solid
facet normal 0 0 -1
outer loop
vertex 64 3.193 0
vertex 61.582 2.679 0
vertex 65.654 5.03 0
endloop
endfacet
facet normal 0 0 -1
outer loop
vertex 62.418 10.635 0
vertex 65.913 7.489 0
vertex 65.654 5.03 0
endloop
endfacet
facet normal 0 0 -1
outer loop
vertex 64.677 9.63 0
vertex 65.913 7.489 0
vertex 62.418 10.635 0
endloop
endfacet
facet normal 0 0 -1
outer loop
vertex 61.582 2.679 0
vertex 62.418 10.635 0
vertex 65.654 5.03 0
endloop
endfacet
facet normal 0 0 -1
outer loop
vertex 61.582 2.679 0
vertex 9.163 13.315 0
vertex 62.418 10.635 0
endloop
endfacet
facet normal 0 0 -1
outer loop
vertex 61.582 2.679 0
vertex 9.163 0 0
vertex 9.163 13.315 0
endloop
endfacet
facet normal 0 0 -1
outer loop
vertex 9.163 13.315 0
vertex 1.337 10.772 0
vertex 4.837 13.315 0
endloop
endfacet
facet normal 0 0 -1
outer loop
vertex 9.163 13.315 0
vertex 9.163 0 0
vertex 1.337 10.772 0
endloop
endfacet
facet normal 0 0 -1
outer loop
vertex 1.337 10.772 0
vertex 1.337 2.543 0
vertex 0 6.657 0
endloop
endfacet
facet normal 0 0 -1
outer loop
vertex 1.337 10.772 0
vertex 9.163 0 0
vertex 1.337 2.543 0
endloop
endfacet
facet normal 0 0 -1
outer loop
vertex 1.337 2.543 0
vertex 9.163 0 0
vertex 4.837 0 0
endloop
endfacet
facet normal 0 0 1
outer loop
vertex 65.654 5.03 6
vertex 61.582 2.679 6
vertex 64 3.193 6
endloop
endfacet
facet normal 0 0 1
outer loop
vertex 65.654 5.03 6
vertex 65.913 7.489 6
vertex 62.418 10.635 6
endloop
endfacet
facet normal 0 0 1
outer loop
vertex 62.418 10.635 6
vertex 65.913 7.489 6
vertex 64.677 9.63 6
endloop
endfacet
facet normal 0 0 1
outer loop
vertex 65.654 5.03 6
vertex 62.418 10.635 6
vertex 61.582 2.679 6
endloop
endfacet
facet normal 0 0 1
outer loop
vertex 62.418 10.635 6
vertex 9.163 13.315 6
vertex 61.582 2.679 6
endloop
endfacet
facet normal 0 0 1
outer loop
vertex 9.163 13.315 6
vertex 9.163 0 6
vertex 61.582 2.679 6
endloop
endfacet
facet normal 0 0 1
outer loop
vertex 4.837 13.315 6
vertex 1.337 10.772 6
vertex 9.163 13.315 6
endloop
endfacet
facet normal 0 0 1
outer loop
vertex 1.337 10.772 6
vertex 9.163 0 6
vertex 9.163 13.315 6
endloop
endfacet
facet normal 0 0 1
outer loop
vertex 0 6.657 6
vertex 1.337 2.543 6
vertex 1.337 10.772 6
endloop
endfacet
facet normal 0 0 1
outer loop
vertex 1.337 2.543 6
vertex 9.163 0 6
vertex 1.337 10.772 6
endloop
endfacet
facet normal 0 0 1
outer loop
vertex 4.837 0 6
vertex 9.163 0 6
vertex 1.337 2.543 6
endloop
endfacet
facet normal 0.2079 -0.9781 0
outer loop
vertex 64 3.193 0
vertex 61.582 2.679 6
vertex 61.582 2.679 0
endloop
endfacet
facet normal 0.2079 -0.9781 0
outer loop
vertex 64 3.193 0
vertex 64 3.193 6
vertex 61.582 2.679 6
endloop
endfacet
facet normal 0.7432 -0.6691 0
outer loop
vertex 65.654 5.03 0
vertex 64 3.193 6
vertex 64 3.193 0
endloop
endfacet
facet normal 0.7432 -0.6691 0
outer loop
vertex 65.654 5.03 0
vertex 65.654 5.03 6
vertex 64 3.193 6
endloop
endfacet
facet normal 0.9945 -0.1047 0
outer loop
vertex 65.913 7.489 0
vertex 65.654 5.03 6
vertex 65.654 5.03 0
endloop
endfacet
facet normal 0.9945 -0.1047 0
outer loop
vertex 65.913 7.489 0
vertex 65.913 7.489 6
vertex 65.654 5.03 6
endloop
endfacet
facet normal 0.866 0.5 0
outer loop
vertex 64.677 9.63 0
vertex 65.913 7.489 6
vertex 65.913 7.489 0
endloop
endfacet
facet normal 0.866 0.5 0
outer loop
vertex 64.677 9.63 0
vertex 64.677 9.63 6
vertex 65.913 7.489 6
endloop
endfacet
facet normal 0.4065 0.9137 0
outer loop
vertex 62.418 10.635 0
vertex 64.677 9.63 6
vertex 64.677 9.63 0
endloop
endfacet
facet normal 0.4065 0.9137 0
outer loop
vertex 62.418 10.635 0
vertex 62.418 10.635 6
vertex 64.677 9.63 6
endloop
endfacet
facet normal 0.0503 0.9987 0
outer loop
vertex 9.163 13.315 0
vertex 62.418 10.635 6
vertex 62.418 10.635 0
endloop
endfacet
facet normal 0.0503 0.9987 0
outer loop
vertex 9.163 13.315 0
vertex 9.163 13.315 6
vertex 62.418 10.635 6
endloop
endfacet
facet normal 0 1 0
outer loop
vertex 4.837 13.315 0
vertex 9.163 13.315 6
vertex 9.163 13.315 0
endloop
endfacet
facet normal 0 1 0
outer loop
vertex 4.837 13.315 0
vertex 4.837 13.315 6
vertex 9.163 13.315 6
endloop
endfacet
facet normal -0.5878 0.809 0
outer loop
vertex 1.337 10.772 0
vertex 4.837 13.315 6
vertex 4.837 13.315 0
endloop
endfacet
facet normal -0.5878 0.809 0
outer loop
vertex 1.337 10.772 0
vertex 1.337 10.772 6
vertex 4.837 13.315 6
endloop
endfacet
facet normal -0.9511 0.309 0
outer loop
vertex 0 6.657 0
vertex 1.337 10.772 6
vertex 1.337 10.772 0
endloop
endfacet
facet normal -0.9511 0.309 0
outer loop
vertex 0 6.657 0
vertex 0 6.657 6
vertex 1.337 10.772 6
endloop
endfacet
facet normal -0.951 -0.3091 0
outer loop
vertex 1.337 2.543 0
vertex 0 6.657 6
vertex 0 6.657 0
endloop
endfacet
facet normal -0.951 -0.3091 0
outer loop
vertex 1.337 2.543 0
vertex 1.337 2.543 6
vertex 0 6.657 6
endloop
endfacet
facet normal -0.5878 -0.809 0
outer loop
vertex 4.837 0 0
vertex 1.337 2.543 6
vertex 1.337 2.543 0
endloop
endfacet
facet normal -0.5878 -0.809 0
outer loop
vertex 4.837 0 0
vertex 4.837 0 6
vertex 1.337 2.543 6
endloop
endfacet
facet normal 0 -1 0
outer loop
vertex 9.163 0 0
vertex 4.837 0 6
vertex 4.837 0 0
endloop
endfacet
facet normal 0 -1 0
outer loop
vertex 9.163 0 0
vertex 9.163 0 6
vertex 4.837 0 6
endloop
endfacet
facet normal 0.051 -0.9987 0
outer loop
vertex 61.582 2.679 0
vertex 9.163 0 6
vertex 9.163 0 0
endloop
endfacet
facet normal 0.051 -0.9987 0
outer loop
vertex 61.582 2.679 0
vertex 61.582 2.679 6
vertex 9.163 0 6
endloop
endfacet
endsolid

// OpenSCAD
$fn = 32;

// ----------------------------------------------------------------------
// Lever arm: two bosses 14 and 8 mm, 55 mm between centres
// ----------------------------------------------------------------------

// --- parameters (mm) ---
profile_height = 6;       // extrusion height
profile_points = 13;      // points of the closed outline

profile = [[0, 6.657], [1.337, 2.543], [4.837, 0], [9.163, 0], [61.582, 2.679], [64, 3.193], [65.654, 5.03], [65.913, 7.489], [64.677, 9.63], [62.418, 10.635], [9.163, 13.315], [4.837, 13.315], [1.337, 10.772]];  // single closed polygon, 13 points, counter clockwise

// --- the one profile operation ---
linear_extrude(height = profile_height) polygon(points = profile);
